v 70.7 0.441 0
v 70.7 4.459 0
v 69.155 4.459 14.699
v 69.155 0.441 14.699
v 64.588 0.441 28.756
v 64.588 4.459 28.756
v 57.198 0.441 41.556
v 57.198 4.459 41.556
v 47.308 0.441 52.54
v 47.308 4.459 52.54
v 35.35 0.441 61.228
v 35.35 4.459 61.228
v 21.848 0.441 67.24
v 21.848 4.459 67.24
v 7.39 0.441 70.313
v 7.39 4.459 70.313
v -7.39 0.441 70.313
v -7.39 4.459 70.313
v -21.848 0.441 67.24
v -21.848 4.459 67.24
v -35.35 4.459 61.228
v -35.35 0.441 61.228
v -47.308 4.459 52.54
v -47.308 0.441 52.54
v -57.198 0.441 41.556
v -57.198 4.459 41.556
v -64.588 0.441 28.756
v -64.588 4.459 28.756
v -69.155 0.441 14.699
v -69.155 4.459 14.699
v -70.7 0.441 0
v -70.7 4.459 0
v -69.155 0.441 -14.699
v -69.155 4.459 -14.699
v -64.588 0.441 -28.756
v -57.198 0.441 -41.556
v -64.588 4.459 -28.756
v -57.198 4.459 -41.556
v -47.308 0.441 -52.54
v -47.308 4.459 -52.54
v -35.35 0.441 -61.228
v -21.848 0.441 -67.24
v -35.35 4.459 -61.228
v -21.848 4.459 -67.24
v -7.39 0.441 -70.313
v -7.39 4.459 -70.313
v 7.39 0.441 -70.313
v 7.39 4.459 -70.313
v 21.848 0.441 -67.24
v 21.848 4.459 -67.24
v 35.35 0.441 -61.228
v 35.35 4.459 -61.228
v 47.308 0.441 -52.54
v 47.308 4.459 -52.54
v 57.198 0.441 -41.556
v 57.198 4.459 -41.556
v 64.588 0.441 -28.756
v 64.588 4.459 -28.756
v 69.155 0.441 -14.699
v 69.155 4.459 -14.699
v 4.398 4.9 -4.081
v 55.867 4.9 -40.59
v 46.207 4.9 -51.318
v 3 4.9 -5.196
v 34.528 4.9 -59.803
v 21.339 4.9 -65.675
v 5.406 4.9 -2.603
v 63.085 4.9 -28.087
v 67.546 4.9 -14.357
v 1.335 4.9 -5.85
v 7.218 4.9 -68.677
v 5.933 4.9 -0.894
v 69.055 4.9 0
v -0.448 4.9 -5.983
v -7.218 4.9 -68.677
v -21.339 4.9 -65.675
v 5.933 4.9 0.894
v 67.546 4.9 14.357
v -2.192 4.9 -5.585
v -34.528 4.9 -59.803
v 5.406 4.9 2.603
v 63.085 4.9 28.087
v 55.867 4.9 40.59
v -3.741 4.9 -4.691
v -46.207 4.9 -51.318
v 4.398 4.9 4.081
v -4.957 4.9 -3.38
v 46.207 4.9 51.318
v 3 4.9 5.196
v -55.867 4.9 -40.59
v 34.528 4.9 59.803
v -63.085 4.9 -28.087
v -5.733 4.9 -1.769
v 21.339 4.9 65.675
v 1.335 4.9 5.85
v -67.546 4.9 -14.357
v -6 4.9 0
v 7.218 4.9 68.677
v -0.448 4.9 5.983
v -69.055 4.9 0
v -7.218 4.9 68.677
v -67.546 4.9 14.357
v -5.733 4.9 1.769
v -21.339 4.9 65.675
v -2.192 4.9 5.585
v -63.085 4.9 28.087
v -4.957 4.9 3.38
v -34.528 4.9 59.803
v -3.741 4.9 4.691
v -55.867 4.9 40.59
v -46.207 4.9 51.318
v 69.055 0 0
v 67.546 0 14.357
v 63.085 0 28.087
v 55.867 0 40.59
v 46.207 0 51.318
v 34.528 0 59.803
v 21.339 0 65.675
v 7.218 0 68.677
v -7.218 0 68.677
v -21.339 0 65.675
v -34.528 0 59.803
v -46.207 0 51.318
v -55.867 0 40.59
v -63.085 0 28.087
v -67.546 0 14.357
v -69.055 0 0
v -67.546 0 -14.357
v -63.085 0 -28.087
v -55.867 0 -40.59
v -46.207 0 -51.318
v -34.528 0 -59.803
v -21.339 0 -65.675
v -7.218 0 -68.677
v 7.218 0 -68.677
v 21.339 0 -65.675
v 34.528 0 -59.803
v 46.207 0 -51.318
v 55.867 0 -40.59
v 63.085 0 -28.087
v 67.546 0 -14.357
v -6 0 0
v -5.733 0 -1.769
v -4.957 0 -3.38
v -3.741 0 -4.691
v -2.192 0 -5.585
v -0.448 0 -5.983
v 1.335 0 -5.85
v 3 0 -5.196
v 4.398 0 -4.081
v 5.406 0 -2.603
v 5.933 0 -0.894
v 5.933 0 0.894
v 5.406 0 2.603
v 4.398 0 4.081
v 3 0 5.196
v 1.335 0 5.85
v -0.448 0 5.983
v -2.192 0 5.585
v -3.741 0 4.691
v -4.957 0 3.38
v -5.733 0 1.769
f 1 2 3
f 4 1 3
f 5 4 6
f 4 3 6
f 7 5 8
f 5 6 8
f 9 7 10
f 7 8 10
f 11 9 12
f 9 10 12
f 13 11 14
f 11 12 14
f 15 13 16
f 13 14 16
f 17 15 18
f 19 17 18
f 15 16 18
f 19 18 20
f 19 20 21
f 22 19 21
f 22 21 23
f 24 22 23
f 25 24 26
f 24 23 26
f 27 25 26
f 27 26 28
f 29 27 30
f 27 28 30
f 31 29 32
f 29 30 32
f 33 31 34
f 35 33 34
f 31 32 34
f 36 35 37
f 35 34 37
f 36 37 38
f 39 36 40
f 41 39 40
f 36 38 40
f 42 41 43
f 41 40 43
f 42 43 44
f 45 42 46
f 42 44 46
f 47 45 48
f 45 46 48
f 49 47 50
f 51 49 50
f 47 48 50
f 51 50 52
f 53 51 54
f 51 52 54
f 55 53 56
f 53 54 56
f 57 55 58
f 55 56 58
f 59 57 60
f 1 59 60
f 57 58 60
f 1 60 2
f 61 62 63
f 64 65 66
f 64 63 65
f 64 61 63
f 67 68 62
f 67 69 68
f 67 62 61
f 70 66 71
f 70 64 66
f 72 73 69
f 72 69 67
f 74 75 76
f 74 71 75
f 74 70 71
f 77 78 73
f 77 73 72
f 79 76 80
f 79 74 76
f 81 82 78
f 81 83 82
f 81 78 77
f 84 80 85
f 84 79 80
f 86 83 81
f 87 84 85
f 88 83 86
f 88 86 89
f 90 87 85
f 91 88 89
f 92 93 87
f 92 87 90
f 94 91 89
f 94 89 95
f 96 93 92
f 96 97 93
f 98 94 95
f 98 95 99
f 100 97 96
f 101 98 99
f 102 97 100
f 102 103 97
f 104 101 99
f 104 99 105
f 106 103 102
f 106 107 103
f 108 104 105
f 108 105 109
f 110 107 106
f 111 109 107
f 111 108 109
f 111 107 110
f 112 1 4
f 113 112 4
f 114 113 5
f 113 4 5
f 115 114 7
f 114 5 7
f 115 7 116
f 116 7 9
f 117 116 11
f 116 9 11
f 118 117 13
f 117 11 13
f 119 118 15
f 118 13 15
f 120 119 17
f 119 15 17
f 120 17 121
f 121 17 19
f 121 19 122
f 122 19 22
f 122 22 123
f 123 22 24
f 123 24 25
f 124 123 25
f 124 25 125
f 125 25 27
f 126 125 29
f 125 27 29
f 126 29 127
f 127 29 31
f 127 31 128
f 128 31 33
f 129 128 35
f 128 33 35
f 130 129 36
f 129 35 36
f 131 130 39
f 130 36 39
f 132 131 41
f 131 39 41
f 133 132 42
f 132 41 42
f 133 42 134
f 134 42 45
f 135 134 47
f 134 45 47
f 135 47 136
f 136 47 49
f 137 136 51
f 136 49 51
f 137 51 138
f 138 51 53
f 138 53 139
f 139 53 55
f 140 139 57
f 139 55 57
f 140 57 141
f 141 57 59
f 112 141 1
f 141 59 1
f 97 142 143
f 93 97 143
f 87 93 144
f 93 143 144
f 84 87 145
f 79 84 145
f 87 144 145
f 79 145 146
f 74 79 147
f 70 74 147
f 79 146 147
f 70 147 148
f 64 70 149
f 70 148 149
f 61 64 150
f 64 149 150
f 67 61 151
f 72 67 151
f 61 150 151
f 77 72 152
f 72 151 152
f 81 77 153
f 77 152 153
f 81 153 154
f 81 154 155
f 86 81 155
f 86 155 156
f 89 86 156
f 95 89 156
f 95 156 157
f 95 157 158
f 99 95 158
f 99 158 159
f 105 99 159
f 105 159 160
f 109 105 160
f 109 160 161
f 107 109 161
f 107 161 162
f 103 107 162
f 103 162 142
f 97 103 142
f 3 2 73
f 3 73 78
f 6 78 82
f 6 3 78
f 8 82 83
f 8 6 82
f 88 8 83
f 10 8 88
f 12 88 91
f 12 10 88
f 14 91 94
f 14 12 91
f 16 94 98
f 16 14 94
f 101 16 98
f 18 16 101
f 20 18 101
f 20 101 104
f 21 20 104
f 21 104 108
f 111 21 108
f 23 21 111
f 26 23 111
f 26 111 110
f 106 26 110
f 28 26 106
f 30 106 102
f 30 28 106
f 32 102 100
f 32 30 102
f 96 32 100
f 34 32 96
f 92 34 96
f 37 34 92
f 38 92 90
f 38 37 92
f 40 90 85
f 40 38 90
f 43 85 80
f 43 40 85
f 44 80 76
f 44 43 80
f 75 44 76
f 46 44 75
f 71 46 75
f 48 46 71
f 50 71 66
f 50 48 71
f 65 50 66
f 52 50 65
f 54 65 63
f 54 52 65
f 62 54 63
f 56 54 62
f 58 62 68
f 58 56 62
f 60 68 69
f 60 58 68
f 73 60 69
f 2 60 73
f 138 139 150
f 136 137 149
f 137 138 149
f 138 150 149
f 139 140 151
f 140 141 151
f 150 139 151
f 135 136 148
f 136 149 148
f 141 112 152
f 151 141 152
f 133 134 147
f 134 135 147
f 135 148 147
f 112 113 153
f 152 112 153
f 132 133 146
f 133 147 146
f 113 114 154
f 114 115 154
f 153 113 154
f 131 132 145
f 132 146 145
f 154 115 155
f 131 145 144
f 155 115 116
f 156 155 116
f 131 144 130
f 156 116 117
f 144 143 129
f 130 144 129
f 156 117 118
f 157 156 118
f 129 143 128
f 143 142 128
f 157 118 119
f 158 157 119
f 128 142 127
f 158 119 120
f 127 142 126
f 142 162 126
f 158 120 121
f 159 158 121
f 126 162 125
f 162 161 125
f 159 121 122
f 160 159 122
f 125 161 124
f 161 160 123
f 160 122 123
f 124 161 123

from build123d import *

# Parameters (mm, degrees)
SKETCH_1_W               = 70.7
SKETCH_1_H               = 4.9
CHAMFER_1_SIZE           = 1.645
CHAMFER_1_SIZE2          = 0.440776422
CHAMFER_2_SIZE           = 1.645
CHAMFER_2_SIZE2          = 0.440776422
SKETCH_2_R               = 6
CUT_EXTRUDE_3_DEPTH      = 1
CUT_EXTRUDE_3_DEPTH_BACK = 5.9


with BuildPart() as part:
    # Эскиз1 → Повернуть2 (revolve)
    with BuildSketch(Plane.XY):
        with Locations((35.35, 2.45)):
            Rectangle(SKETCH_1_W, SKETCH_1_H)
    revolve(axis=Axis((0, 4.9, 0), (0, -1, 0)))

    # Фаска1
    chamfer_1_edges = [part.edges().sort_by_distance(p)[0] for p in [
        (-70.7, 4.9, 0),
    ]]
    chamfer_1_side = [part.faces().sort_by_distance(p)[0] for p in [
        (0, 4.9, 0),
    ]]
    chamfer(chamfer_1_edges, length=CHAMFER_1_SIZE, length2=CHAMFER_1_SIZE2, reference=chamfer_1_side[0])

    # Фаска2
    chamfer_2_edges = [part.edges().sort_by_distance(p)[0] for p in [
        (-70.7, 0, 0),
    ]]
    chamfer_2_side = [part.faces().sort_by_distance(p)[0] for p in [
        (0, 0, 0),
    ]]
    chamfer(chamfer_2_edges, length=CHAMFER_2_SIZE, length2=CHAMFER_2_SIZE2, reference=chamfer_2_side[0])

    # Эскиз2 → Вырез-Вытянуть3 (cut, two sides)
    with BuildSketch(Plane(origin=(0, 0, 0), x_dir=(-1, 0, 0), z_dir=(0, -1, 0))) as cut_extrude_3_sk:
        Circle(SKETCH_2_R)
    extrude(amount=CUT_EXTRUDE_3_DEPTH, mode=Mode.SUBTRACT)
    extrude(cut_extrude_3_sk.sketch, amount=-CUT_EXTRUDE_3_DEPTH_BACK, mode=Mode.SUBTRACT)


solid = part.part
